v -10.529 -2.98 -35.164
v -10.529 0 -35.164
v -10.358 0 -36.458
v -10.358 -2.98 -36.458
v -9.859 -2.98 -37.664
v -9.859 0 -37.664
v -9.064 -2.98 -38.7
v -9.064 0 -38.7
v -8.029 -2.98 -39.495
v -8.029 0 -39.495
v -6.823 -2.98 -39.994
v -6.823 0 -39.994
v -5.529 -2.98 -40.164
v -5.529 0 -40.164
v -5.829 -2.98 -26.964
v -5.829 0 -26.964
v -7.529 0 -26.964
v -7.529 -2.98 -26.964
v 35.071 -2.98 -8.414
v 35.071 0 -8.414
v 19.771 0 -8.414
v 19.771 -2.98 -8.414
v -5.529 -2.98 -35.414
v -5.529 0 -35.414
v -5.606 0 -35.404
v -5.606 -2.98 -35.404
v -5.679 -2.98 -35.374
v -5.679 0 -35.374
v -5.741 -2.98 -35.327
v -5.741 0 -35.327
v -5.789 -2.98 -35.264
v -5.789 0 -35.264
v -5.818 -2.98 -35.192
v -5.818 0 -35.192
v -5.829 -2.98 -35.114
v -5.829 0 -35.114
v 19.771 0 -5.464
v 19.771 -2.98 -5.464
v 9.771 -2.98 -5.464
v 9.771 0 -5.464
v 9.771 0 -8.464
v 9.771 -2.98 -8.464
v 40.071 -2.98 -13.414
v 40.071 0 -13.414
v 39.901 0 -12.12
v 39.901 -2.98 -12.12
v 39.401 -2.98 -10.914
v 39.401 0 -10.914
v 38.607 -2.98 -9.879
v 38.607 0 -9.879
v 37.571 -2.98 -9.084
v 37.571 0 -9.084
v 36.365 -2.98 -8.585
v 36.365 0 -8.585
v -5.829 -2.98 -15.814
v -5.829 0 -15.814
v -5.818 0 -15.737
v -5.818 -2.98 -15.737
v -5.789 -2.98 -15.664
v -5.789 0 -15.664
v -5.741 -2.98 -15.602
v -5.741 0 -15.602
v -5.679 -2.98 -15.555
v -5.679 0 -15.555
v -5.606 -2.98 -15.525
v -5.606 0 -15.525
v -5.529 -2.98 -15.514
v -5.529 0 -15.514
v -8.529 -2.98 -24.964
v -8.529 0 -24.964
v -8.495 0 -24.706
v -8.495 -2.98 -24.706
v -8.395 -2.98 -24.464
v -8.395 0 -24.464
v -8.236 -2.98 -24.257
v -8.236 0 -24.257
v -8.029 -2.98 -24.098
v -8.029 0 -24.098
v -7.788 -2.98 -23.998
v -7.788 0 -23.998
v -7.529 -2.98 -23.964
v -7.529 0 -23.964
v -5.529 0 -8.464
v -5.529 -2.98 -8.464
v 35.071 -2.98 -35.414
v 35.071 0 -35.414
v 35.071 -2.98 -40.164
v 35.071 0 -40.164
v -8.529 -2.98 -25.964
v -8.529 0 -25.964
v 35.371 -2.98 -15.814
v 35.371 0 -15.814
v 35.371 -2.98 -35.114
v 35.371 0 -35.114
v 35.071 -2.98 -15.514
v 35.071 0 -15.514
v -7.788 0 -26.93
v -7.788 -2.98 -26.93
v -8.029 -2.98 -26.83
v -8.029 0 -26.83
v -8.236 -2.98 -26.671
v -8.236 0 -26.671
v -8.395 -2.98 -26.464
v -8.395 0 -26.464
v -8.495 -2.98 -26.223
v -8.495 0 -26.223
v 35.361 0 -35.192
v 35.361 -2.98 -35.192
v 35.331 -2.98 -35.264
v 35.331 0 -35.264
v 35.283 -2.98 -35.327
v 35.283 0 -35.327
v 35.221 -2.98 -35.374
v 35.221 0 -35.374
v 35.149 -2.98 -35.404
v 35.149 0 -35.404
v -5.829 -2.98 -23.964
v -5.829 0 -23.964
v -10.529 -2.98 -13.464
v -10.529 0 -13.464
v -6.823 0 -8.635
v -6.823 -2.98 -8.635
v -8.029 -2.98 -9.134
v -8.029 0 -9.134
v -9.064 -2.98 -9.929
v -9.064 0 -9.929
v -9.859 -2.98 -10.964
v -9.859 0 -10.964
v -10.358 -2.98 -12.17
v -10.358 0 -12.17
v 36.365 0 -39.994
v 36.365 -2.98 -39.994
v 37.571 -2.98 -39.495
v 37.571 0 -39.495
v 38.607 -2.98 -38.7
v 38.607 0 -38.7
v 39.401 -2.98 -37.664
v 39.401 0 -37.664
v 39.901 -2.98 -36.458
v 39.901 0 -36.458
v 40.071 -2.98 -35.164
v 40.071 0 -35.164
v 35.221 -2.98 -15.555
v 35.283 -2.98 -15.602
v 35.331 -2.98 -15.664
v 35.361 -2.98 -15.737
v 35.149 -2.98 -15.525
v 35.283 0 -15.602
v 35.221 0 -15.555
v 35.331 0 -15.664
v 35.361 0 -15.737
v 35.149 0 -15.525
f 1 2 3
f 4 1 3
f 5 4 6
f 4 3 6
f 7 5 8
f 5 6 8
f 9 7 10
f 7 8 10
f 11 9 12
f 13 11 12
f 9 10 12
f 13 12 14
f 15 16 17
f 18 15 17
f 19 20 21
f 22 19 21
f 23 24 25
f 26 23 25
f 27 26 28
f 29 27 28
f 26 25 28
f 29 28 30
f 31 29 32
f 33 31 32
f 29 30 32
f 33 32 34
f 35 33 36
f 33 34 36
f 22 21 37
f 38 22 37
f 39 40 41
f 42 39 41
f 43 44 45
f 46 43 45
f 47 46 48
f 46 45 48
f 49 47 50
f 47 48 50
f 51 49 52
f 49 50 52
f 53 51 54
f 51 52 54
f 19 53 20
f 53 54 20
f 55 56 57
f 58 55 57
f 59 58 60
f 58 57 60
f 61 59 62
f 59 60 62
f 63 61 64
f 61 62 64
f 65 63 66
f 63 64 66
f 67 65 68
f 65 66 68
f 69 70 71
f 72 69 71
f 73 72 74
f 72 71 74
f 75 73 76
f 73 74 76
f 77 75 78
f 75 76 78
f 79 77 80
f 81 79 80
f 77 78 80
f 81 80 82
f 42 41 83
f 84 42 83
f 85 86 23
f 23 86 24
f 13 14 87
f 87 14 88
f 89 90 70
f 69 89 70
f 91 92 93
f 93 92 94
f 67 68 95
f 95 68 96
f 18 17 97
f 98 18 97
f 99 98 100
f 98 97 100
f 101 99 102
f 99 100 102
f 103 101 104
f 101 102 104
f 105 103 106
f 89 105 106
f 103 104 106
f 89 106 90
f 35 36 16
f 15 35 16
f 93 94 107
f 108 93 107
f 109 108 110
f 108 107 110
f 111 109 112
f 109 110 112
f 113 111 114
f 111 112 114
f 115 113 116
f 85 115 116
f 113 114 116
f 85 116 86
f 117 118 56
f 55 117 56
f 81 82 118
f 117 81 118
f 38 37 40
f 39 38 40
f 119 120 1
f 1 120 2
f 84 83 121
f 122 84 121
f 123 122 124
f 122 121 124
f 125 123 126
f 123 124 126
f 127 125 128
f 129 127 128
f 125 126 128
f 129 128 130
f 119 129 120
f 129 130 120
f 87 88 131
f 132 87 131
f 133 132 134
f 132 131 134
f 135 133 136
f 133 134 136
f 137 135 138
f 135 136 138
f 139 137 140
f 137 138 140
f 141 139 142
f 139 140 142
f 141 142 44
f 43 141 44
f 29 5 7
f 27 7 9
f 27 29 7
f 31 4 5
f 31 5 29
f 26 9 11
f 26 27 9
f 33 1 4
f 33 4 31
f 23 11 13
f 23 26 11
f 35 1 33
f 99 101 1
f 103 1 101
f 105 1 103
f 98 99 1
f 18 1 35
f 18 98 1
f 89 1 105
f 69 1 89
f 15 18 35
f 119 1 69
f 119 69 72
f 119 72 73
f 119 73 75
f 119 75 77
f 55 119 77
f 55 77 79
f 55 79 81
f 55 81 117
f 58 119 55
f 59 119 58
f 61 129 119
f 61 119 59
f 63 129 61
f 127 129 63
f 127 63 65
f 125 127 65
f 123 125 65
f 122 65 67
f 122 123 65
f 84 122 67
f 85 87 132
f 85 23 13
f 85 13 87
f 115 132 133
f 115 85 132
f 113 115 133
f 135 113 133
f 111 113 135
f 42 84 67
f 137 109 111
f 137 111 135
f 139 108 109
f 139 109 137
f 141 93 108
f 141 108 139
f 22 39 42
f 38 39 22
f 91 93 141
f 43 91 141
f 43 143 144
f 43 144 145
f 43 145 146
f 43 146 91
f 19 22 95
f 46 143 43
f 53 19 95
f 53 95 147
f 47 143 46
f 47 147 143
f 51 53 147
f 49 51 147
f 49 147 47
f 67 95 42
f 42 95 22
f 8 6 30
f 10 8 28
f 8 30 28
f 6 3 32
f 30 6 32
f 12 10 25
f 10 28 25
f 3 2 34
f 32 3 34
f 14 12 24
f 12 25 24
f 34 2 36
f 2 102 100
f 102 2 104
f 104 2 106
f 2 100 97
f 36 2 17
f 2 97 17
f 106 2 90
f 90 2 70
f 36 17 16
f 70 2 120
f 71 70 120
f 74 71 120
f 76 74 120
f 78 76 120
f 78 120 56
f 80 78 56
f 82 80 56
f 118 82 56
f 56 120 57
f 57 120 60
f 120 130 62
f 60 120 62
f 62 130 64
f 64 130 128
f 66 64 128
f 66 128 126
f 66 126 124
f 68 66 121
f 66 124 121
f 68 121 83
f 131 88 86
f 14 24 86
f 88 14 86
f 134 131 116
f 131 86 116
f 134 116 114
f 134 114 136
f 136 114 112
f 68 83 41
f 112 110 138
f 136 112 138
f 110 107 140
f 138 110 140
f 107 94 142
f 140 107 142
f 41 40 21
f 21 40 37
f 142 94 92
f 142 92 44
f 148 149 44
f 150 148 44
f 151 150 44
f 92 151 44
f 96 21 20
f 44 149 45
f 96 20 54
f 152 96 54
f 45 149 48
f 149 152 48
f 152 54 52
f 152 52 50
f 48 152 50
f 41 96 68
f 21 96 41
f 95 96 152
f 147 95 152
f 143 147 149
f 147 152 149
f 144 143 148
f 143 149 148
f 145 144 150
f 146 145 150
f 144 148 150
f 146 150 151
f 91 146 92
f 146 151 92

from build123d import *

# Parameters (mm, degrees)
F0_W     = 8.4663171785
F0_H     = 4.75
F1_DEPTH = 2.98


with BuildPart() as f1:
    # F0 (on Front) → F1 (new body)
    with BuildSketch(Plane.XZ):
        with Locations((14.7712850711, -37.7893784919)):
            Rectangle(F0_W, F0_H)
        with BuildLine():
            Line((19.7712850711, -8.4143784919), (19.7712850711, -5.4643784919))
            Line((19.7712850711, -5.4643784919), (9.7712850711, -5.4643784919))
            Line((9.7712850711, -5.4643784919), (9.7712850711, -8.4643784919))
            Line((9.7712850711, -8.4643784919), (-5.5287149289, -8.4643784919))
            ThreePointArc((-5.5287149289, -8.4643784919), (-9.0642488348, -9.9288445859), (-10.5287149289, -13.4643784919))
            Line((-10.5287149289, -13.4643784919), (-10.5287149289, -15.8643784919))
            Line((-10.5287149289, -15.8643784919), (-10.5287149289, -35.1643784919))
            ThreePointArc((-10.5287149289, -35.1643784919), (-9.0642488348, -38.6999123978), (-5.5287149289, -40.1643784919))
            Line((-5.5287149289, -40.1643784919), (10.5381264819, -40.1643784919))
            Line((10.5381264819, -40.1643784919), (10.5381264819, -35.4143784919))
            Line((10.5381264819, -35.4143784919), (-5.5287149289, -35.4143784919))
            ThreePointArc((-5.5287149289, -35.4143784919), (-5.7408469632, -35.3265105262), (-5.8287149289, -35.1143784919))
            Line((-5.8287149289, -35.1143784919), (-5.8287149289, -26.9643784919))
            Line((-5.8287149289, -26.9643784919), (-7.5287149289, -26.9643784919))
            ThreePointArc((-7.5287149289, -26.9643784919), (-8.2358217101, -26.6714852731), (-8.5287149289, -25.9643784919))
            Line((-8.5287149289, -25.9643784919), (-8.5287149289, -24.9643784919))
            ThreePointArc((-8.5287149289, -24.9643784919), (-8.2358217101, -24.2572717107), (-7.5287149289, -23.9643784919))
            Line((-7.5287149289, -23.9643784919), (-5.8287149289, -23.9643784919))
            Line((-5.8287149289, -23.9643784919), (-5.8287149289, -15.8143784919))
            ThreePointArc((-5.8287149289, -15.8143784919), (-5.7408469632, -15.6022464575), (-5.5287149289, -15.5143784919))
            Line((-5.5287149289, -15.5143784919), (35.0712850711, -15.5143784919))
            ThreePointArc((35.0712850711, -15.5143784919), (35.2834171055, -15.6022464575), (35.3712850711, -15.8143784919))
            Line((35.3712850711, -15.8143784919), (35.3712850711, -35.1143784919))
            ThreePointArc((35.3712850711, -35.1143784919), (35.2834171055, -35.3265105262), (35.0712850711, -35.4143784919))
            Line((35.0712850711, -35.4143784919), (19.0044436604, -35.4143784919))
            Line((19.0044436604, -35.4143784919), (19.0044436604, -40.1643784919))
            Line((19.0044436604, -40.1643784919), (35.0712850711, -40.1643784919))
            ThreePointArc((35.0712850711, -40.1643784919), (38.6068189771, -38.6999123978), (40.0712850711, -35.1643784919))
            Line((40.0712850711, -35.1643784919), (40.0712850711, -13.4143784919))
            ThreePointArc((40.0712850711, -13.4143784919), (38.6068189771, -9.8788445859), (35.0712850711, -8.4143784919))
            Line((35.0712850711, -8.4143784919), (19.7712850711, -8.4143784919))
        make_face()
    extrude(amount=F1_DEPTH)


solid = f1.part
